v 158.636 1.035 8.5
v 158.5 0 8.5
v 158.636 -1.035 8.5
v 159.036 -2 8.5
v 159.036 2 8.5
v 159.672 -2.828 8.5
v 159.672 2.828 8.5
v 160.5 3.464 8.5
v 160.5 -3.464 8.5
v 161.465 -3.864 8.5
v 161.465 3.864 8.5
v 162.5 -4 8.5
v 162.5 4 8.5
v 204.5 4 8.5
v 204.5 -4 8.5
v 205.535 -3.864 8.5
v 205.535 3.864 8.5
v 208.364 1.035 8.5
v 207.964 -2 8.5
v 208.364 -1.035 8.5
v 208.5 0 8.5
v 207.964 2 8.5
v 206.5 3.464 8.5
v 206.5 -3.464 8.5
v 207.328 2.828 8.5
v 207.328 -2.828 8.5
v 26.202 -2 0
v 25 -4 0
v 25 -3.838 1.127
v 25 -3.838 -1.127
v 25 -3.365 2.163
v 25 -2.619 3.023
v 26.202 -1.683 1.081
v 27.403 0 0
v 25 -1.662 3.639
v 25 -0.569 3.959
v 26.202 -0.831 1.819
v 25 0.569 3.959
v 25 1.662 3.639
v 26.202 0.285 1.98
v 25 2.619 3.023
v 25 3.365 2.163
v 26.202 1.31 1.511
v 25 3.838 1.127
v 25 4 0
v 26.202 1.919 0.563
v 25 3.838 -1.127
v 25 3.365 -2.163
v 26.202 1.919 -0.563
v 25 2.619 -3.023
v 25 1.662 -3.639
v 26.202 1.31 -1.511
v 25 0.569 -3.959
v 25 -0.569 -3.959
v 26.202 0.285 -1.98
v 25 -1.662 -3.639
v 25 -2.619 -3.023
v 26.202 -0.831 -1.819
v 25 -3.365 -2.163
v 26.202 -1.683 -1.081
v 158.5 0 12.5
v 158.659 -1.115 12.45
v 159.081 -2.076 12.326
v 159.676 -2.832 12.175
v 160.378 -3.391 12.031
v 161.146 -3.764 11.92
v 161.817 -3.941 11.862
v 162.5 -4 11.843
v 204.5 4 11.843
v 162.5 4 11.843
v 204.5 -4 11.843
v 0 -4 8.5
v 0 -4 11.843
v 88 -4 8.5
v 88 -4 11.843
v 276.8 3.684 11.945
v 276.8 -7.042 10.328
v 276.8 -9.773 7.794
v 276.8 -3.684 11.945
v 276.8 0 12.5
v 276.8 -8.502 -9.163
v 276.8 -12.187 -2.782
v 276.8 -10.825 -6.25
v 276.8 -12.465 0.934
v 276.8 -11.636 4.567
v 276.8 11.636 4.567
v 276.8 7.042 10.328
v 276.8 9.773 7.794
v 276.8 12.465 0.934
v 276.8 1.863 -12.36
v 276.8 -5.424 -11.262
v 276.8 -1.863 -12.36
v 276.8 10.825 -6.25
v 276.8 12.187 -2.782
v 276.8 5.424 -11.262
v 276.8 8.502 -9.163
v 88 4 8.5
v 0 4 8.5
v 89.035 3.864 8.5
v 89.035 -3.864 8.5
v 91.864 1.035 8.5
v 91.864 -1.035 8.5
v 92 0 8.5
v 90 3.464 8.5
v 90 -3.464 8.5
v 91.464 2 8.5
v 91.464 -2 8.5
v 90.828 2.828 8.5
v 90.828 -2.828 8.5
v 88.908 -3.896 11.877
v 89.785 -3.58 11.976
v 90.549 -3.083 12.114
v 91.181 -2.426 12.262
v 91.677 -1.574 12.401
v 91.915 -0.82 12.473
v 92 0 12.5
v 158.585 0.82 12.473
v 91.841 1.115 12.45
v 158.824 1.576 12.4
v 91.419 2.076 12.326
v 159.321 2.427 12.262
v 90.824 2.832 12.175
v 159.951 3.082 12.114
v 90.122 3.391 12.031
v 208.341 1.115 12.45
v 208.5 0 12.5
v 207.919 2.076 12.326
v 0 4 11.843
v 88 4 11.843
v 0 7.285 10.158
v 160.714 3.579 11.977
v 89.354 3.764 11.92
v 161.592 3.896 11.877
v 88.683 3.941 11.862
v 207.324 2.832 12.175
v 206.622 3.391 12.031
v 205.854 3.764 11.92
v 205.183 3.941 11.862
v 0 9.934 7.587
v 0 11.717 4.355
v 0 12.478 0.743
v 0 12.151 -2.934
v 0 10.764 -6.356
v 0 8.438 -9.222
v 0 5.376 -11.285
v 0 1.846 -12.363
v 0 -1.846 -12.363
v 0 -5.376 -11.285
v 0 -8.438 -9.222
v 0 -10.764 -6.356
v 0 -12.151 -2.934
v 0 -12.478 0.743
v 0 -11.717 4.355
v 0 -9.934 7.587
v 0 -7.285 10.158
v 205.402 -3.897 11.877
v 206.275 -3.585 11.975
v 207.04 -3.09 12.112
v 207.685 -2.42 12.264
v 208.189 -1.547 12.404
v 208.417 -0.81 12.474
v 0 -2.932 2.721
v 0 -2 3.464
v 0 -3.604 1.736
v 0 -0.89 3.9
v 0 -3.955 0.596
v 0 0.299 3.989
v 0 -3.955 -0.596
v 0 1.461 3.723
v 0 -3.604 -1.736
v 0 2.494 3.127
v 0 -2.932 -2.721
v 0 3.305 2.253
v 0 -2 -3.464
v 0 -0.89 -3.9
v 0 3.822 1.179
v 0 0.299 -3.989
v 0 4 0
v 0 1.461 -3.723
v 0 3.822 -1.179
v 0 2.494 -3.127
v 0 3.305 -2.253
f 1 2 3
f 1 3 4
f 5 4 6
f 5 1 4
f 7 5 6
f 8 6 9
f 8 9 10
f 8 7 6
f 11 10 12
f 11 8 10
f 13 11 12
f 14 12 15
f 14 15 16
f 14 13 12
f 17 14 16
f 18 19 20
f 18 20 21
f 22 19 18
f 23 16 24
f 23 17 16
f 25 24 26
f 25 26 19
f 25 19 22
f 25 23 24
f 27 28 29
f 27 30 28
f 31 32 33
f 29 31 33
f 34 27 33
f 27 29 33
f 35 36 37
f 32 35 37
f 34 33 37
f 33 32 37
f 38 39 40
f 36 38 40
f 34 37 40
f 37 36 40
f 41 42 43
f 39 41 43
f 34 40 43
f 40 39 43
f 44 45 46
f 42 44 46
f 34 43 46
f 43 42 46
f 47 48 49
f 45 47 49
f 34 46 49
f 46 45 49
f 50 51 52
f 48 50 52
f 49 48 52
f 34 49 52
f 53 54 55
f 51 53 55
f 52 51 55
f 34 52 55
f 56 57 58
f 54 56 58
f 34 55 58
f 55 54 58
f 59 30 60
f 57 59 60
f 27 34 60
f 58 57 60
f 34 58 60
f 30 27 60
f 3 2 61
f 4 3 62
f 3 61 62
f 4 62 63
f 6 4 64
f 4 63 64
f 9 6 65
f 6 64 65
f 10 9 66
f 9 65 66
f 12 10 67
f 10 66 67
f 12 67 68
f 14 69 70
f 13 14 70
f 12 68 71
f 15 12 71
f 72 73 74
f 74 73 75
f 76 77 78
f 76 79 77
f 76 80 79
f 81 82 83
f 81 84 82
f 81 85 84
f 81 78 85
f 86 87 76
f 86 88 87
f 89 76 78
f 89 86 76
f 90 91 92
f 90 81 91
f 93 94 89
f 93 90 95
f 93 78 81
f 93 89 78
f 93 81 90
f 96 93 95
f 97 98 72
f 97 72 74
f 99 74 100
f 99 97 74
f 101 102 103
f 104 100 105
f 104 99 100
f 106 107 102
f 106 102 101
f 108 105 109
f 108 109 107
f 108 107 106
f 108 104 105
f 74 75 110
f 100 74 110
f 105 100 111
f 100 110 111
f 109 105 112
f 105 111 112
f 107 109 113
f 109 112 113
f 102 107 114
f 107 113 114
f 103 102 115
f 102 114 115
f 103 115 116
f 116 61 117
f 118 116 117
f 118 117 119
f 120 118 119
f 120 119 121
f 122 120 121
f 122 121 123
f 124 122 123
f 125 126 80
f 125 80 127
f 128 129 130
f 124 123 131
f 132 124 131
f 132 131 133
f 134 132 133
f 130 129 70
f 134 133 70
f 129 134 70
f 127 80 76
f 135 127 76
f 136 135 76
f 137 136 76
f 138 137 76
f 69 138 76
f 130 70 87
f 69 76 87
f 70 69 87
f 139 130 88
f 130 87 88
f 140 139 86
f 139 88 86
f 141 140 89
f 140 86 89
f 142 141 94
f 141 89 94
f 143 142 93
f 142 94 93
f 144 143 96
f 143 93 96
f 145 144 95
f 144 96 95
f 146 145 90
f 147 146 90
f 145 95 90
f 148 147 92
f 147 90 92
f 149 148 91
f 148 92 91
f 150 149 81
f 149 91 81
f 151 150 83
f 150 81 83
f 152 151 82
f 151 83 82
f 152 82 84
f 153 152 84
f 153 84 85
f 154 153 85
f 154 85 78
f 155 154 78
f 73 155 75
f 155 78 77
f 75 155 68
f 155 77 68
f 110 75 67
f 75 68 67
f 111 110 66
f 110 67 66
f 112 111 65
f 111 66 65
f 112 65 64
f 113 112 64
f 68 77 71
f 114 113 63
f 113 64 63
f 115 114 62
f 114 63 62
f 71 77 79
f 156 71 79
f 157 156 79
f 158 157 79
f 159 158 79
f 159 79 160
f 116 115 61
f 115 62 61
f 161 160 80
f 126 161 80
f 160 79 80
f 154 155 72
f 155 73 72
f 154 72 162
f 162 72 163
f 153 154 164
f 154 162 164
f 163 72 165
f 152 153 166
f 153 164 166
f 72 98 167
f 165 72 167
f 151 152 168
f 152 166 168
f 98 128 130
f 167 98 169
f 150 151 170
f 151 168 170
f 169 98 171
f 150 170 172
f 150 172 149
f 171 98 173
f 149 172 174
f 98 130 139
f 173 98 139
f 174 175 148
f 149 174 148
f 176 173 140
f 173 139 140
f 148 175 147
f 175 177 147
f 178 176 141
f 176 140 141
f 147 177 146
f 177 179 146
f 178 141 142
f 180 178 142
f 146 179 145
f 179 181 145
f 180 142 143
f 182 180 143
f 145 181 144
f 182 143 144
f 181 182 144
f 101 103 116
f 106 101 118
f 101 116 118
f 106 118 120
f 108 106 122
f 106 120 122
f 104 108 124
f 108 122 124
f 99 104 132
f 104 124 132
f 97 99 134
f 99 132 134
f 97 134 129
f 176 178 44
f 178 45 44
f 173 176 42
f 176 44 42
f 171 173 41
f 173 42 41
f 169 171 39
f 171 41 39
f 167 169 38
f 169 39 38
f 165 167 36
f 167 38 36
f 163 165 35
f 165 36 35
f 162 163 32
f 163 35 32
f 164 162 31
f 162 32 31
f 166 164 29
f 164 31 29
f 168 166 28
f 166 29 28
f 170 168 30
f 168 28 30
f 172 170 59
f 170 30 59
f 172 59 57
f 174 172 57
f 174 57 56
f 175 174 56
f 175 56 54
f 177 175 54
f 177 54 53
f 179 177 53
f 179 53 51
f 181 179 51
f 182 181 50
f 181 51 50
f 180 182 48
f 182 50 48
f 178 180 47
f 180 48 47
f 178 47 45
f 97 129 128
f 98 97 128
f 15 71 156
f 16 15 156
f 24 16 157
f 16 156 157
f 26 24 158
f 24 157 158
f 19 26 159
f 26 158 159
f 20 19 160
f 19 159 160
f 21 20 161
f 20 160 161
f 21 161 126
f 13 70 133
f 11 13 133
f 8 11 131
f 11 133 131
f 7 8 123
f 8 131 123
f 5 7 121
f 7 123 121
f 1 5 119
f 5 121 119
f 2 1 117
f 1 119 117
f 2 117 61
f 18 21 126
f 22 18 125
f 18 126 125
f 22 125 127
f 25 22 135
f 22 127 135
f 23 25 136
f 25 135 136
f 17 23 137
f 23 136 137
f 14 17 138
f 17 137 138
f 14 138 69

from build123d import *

# Parameters (mm, degrees)
F0_W     = 276.8
F0_H     = 12.5
F4_DEPTH = 4
F6_D     = 8
F6_DEPTH = 25
F6_TIP   = 2.4034424761
F8_DEPTH = 4


with BuildPart() as f1:
    # F0 (on Front) → F1 (revolve)
    with BuildSketch(Plane.XZ):
        with Locations((138.4, 6.25)):
            Rectangle(F0_W, F0_H)
    revolve(axis=Axis((138.4, 0, 0), (-1, 0, 0)))

    # F3 (on offset) → F4 (cut)
    with BuildSketch(Plane.XY.offset(12.5)):
        with BuildLine():
            Line((0, 4), (0, 0))
            Line((0, 0), (0, -4))
            Line((0, -4), (88, -4))
            ThreePointArc((88, -4), (90.8284271247, -2.8284271247), (92, 0))
            ThreePointArc((92, 0), (90.8284271247, 2.8284271247), (88, 4))
            Line((88, 4), (0, 4))
        make_face()
    extrude(amount=-F4_DEPTH, mode=Mode.SUBTRACT)

    # F6
    with Locations(Plane(origin=(0, 0, 0), x_dir=(0, -1, 0), z_dir=(-1, 0, 0))):
        with Locations((0, 0)):
            Hole(F6_D / 2, depth=F6_DEPTH)
            with Locations((0, 0, -(F6_DEPTH + F6_TIP / 2))):  # 118° drill point
                Cone(0, F6_D / 2, F6_TIP, mode=Mode.SUBTRACT)

    # F7 (on offset) → F8 (cut)
    with BuildSketch(Plane.XY.offset(12.5)):
        with BuildLine():
            ThreePointArc((208.5, 0), (207.3284271247, 2.8284271247), (204.5, 4))
            Line((204.5, 4), (162.5, 4))
            ThreePointArc((162.5, 4), (159.6715728753, 2.8284271247), (158.5, 0))
            ThreePointArc((158.5, 0), (159.6715728753, -2.8284271247), (162.5, -4))
            Line((162.5, -4), (204.5, -4))
            ThreePointArc((204.5, -4), (207.3284271247, -2.8284271247), (208.5, 0))
        make_face()
    extrude(amount=-F8_DEPTH, mode=Mode.SUBTRACT)


solid = f1.part
